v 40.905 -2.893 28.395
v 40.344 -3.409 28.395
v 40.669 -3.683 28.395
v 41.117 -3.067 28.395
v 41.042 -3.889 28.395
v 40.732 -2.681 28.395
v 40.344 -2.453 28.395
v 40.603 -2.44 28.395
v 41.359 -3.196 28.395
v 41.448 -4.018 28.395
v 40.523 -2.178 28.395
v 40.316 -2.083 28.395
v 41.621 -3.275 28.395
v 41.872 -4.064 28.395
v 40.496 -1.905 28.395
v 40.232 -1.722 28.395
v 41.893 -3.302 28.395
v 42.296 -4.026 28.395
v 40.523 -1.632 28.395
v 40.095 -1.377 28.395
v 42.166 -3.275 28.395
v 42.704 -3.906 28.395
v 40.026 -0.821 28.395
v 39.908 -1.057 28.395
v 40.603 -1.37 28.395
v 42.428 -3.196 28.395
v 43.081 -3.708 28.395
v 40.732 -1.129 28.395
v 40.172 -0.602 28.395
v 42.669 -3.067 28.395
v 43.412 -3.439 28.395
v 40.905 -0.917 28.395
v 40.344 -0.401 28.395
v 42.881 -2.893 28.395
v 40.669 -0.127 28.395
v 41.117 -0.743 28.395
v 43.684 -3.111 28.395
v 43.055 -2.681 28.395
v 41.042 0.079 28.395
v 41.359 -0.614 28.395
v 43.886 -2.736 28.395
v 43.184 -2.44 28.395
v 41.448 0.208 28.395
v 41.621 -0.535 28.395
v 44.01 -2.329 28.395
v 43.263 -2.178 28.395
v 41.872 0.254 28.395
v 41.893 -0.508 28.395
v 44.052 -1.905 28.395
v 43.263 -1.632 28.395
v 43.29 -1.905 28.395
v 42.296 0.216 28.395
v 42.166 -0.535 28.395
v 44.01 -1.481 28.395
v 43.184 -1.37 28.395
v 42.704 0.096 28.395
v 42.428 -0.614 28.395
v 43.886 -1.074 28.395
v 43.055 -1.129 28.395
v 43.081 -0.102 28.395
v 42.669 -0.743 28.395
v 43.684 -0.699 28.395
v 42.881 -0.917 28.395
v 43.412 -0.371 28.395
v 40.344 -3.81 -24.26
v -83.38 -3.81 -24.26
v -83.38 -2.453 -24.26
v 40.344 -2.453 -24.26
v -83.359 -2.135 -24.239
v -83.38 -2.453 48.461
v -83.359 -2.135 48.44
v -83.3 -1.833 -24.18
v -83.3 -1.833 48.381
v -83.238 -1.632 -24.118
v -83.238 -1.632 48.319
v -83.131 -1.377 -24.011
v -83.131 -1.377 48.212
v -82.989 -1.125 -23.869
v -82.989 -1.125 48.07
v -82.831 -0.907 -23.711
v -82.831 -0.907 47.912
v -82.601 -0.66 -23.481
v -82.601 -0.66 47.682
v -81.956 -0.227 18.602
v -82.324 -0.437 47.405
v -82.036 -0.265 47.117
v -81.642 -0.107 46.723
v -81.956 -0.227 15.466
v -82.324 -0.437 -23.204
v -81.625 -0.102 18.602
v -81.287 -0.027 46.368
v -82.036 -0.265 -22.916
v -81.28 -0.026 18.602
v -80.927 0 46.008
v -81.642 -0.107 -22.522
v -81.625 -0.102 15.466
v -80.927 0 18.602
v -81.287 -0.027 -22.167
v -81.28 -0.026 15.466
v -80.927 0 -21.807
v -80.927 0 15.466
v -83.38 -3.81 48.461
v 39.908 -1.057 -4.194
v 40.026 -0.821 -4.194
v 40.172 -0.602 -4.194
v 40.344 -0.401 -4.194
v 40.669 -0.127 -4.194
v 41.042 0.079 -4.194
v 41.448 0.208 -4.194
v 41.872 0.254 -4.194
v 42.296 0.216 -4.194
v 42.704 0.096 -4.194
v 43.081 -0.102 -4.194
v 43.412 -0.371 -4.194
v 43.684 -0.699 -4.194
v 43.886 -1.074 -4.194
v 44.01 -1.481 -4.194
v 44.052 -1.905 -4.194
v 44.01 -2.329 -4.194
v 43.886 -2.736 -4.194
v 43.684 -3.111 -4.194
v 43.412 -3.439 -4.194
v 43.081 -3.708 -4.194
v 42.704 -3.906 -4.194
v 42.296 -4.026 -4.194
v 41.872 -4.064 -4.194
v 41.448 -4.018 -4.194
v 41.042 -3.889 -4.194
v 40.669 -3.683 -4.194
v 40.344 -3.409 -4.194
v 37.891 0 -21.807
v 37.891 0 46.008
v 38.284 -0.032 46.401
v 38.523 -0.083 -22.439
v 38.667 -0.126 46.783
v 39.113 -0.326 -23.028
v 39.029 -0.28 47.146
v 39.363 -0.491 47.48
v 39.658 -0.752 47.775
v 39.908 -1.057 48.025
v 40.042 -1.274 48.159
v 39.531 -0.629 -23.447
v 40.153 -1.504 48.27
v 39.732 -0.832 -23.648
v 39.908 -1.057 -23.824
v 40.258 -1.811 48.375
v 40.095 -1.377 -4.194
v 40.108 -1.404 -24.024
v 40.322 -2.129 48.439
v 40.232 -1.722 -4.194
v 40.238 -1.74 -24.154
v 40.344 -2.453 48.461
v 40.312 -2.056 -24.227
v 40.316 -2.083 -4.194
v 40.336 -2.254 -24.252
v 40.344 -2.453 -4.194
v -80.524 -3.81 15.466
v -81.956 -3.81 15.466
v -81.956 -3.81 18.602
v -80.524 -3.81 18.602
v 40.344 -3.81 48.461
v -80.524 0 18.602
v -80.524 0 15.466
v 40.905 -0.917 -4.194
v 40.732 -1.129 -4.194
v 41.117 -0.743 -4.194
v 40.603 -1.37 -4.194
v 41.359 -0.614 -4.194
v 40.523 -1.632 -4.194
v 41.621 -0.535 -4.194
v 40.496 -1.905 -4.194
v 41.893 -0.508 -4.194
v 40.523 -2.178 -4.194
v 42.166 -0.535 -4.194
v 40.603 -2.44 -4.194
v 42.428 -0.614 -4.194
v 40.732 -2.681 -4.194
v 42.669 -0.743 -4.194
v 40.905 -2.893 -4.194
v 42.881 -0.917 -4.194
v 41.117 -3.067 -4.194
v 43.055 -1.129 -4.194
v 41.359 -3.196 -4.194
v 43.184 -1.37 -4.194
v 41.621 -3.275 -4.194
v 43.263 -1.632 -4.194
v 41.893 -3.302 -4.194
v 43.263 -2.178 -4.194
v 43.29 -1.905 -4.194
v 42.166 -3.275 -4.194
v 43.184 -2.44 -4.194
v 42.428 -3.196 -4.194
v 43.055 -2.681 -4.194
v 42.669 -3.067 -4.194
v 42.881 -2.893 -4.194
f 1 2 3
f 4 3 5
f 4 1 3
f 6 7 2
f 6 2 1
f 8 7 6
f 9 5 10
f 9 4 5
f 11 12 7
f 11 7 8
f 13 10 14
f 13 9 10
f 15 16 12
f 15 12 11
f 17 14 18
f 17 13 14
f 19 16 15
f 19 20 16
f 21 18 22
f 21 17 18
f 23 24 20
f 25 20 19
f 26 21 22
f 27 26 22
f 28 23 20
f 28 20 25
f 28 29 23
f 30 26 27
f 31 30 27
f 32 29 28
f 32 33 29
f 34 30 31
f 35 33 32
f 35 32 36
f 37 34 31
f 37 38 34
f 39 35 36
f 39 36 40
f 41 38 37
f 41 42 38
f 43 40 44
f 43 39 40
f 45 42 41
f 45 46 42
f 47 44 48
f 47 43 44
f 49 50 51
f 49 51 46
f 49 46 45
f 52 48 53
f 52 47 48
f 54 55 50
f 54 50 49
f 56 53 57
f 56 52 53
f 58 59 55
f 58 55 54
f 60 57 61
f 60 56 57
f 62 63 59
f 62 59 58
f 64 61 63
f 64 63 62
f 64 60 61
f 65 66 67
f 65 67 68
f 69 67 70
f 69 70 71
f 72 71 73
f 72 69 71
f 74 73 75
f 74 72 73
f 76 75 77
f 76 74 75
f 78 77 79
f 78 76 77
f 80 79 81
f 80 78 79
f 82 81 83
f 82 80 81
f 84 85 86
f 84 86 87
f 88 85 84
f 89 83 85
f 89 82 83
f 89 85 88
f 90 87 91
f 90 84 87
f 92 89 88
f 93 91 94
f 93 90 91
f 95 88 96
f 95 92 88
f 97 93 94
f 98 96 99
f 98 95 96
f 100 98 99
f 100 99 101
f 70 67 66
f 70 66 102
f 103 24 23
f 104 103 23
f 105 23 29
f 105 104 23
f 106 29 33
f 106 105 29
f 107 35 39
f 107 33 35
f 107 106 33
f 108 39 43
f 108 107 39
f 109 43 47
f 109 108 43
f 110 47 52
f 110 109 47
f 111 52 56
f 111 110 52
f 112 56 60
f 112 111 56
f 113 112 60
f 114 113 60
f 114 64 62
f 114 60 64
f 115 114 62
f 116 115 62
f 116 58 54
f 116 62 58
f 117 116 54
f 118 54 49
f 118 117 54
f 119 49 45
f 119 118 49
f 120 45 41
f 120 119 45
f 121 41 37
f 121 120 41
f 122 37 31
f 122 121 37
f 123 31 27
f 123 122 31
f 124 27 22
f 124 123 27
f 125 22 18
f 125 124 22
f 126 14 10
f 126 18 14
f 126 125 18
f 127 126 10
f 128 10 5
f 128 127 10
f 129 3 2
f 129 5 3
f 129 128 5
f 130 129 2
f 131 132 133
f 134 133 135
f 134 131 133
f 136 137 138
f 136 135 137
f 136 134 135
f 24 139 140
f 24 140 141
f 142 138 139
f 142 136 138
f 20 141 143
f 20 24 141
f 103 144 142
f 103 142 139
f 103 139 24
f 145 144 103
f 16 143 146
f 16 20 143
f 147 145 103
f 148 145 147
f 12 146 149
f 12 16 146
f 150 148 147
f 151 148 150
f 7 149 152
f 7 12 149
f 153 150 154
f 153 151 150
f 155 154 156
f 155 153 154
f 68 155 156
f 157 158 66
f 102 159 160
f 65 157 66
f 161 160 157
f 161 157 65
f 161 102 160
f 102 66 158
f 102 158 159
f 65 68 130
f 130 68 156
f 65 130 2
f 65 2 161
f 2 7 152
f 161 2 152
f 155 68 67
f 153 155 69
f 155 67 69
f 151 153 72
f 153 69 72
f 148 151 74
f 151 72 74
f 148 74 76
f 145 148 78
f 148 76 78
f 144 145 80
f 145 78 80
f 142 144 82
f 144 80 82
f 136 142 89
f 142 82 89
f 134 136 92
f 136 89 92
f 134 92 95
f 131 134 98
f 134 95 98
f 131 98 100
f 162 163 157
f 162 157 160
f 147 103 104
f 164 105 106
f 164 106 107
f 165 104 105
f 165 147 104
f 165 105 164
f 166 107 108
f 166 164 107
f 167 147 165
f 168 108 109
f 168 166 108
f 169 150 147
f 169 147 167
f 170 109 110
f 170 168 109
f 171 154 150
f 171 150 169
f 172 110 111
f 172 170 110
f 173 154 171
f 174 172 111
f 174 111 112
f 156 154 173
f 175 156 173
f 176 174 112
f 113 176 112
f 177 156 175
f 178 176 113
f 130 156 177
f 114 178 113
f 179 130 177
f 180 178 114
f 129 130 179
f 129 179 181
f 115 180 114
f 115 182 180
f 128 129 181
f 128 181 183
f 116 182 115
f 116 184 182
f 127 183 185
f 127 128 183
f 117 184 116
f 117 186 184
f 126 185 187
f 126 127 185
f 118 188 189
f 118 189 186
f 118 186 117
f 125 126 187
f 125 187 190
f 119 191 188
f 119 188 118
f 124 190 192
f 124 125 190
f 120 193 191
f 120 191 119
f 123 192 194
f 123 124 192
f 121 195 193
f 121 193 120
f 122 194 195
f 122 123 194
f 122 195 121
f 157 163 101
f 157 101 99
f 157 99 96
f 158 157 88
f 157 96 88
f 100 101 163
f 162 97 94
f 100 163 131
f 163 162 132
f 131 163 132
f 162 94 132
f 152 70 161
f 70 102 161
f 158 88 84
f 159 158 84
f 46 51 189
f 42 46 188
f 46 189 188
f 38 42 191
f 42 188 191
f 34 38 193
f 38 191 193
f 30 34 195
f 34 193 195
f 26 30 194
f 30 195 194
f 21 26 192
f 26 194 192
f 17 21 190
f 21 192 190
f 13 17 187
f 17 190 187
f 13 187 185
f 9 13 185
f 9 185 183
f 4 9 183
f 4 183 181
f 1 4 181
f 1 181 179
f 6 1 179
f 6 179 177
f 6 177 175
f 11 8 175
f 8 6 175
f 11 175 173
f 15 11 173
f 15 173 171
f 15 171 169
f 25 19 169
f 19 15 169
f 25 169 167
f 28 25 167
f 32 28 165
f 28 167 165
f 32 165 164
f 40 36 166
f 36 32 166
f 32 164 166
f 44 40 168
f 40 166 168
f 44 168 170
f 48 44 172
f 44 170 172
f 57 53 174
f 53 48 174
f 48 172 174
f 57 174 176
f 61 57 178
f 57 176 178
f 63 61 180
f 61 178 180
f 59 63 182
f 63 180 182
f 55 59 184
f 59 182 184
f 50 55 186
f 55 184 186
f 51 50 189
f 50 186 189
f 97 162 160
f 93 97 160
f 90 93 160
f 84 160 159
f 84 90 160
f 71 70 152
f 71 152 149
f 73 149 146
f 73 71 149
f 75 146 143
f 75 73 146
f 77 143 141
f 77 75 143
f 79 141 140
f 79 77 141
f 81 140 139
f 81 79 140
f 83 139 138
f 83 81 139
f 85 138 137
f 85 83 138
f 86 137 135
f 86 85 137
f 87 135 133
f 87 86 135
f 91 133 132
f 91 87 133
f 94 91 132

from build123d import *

# Parameters (mm, degrees)
F0_W          = 123.7234
F0_H          = 72.7202
F1_DEPTH      = 3.81
F2_R          = 2.159
F2_R_2        = 1.397
F3_DEPTH      = 72.7202
F4_R          = 1.397
F5_DEPTH      = 20.066
F6_R          = 1.397
F7_DEPTH      = 20.066
F8_W          = 1.4323815703
F8_H          = 3.1365510076
F9_DEPTH      = 25.4
F10_T1_DEPTH  = 135.9876048969
F10_T3_DEPTH  = 84.9844048969
F10_T8_DEPTH  = 84.9844048969
F10_S10_R     = 2.159
F10_T11_DEPTH = 44
F10_T15_DEPTH = 84.9844048969
F10_S17_R     = 2.159
F10_T18_DEPTH = 44
F10_T22_DEPTH = 84.9844048969
F10_S24_R     = 2.159
F10_T25_DEPTH = 44
F10_T30_DEPTH = 84.9844048969
F10_S31_R     = 2.159
F10_T32_DEPTH = 44
F10_T37_DEPTH = 84.9844048969
F10_S38_R     = 2.159
F10_T39_DEPTH = 44


# Not quite as in the source:
# - a fillet or chamfer that OpenCascade refuses, or shapes differently, is made with other operations: its cross-section is extruded or revolved along the edge and cut away or added


with BuildPart() as f1:
    # F0 (on Front) → F1 (new body)
    with BuildSketch(Plane.XZ):
        with Locations((-21.517843008, 12.1004326615)):
            Rectangle(F0_W, F0_H)
    extrude(amount=F1_DEPTH)

    # F2 (on face) → F3 (join)
    with BuildSketch(Plane(origin=(0, 0, -24.2596673385), x_dir=(1, 0, 0), z_dir=(0, 0, -1))):
        with Locations((41.893256992, 1.905)):
            Circle(F2_R)
        with Locations((41.893256992, 1.905)):
            Circle(F2_R_2, mode=Mode.SUBTRACT)
    extrude(amount=-F3_DEPTH)

    # F4 (on face) → F5 (cut)
    with BuildSketch(Plane(origin=(0, 0, -24.2596673385), x_dir=(1, 0, 0), z_dir=(0, 0, -1))):
        with BuildLine():
            ThreePointArc((40.343856992, 0.4014573036), (44.052256992, 1.905), (40.343856992, 3.4085426964))
            Line((40.343856992, 3.4085426964), (40.343856992, 0.4014573036))
        make_face()
        with Locations((41.893256992, 1.905)):
            Circle(F4_R, mode=Mode.SUBTRACT)
    extrude(amount=-F5_DEPTH, mode=Mode.SUBTRACT)

    # F6 (on face) → F7 (cut)
    with BuildSketch(Plane.XY.offset(48.4605326615)):
        with BuildLine():
            ThreePointArc((40.343856992, -3.4085426964), (44.052256992, -1.905), (40.343856992, -0.4014573036))
            Line((40.343856992, -0.4014573036), (40.343856992, -3.4085426964))
        make_face()
        with Locations((41.893256992, -1.905)):
            Circle(F6_R, mode=Mode.SUBTRACT)
    extrude(amount=-F7_DEPTH, mode=Mode.SUBTRACT)

    # F8 (on face) → F9 (cut)
    with BuildSketch(Plane(origin=(0, 0, 0), x_dir=(-1, 0, 0), z_dir=(0, 1, 0))):
        with Locations((81.2400989234, 17.0341590419)):
            Rectangle(F8_W, F8_H)
    extrude(amount=-F9_DEPTH, mode=Mode.SUBTRACT)

    # F10: fillet of radius 2.4528409794 on 4 edges, made by hand

    # F10_s2 → F10_t1 (cut)
    with BuildSketch(Plane.YZ.offset(-89.5116454565)):
        with BuildLine():
            ThreePointArc((-2.4528409794, 48.4605326615), (-0.7184204897, 47.7421121718), (0, 46.0076916821))
            Line((0, 46.0076916821), (0, 48.4605326615))
            Line((0, 48.4605326615), (-2.4528409794, 48.4605326615))
        make_face()
        with BuildLine():
            ThreePointArc((-2.4528409794, -24.2596673385), (-0.7184204897, -23.5412468488), (0, -21.8068263591))
            Line((0, -21.8068263591), (0, -24.2596673385))
            Line((0, -24.2596673385), (-2.4528409794, -24.2596673385))
        make_face()
    extrude(amount=F10_T1_DEPTH, mode=Mode.SUBTRACT)

    # F10_s4 → F10_t3 (cut)
    with BuildSketch(Plane.XY.offset(-30.3917697869)):
        with BuildLine():
            ThreePointArc((-83.379543008, -2.4528409794), (-82.6611225184, -0.7184204897), (-80.9267020287, 0))
            Line((-80.9267020287, 0), (-83.379543008, 0))
            Line((-83.379543008, 0), (-83.379543008, -2.4528409794))
        make_face()
    extrude(amount=F10_T3_DEPTH, mode=Mode.SUBTRACT)


with BuildPart() as f10_tool6:
    # F10_s7 → F10_t8 (new body)
    with BuildSketch(Plane.XY.offset(-30.3917697869)):
        with BuildLine():
            ThreePointArc((37.8910160126, 0), (39.6254365023, -0.7184204897), (40.343856992, -2.4528409794))
            Line((40.343856992, -2.4528409794), (40.343856992, 0))
            Line((40.343856992, 0), (37.8910160126, 0))
        make_face()
    extrude(amount=F10_T8_DEPTH)

    split(bisect_by=Plane.XY.offset(-4.1936673385), keep=Keep.BOTTOM)

    # F10_s10 → F10_t11 (cut, symmetric)
    with BuildSketch(Plane.XY.offset(12.1)):
        with Locations((41.893256992, -1.905)):
            Circle(F10_S10_R)
    extrude(amount=F10_T11_DEPTH, both=True, mode=Mode.SUBTRACT)


with BuildPart() as f1_1:
    add(f1.part)

    # F10_t5: cut F10_tool6
    add(f10_tool6.part, mode=Mode.SUBTRACT)


with BuildPart() as f10_tool13:
    # F10_s14 → F10_t15 (new body)
    with BuildSketch(Plane.XY.offset(-30.3917697869)):
        with BuildLine():
            ThreePointArc((37.8910160126, 0), (39.6254365023, -0.7184204897), (40.343856992, -2.4528409794))
            Line((40.343856992, -2.4528409794), (40.343856992, 0))
            Line((40.343856992, 0), (37.8910160126, 0))
        make_face()
    extrude(amount=F10_T15_DEPTH)

    split(bisect_by=Plane.XY.offset(-4.1936673385), keep=Keep.BOTTOM)

    # F10_s17 → F10_t18 (intersect, symmetric)
    with BuildSketch(Plane.XY.offset(12.1)):
        with Locations((41.893256992, -1.905)):
            Circle(F10_S17_R)
    extrude(amount=F10_T18_DEPTH, both=True, mode=Mode.INTERSECT)


with BuildPart() as f1_2:
    add(f1_1.part)

    # F10_t12: cut F10_tool13
    add(f10_tool13.part, mode=Mode.SUBTRACT)


with BuildPart() as f10_tool20:
    # F10_s21 → F10_t22 (new body)
    with BuildSketch(Plane.XY.offset(-30.3917697869)):
        with BuildLine():
            ThreePointArc((37.8910160126, 0), (39.6254365023, -0.7184204897), (40.343856992, -2.4528409794))
            Line((40.343856992, -2.4528409794), (40.343856992, 0))
            Line((40.343856992, 0), (37.8910160126, 0))
        make_face()
    extrude(amount=F10_T22_DEPTH)

    split(bisect_by=Plane.XY.offset(-4.1936673385), keep=Keep.TOP)

    # F10_s24 → F10_t25 (cut, symmetric)
    with BuildSketch(Plane.XY.offset(12.1)):
        with Locations((41.893256992, -1.905)):
            Circle(F10_S24_R)
    extrude(amount=F10_T25_DEPTH, both=True, mode=Mode.SUBTRACT)

    split(bisect_by=Plane.XY.offset(28.3945326615), keep=Keep.BOTTOM)


with BuildPart() as f1_3:
    add(f1_2.part)

    # F10_t19: cut F10_tool20
    add(f10_tool20.part, mode=Mode.SUBTRACT)


with BuildPart() as f10_tool28:
    # F10_s29 → F10_t30 (new body)
    with BuildSketch(Plane.XY.offset(-30.3917697869)):
        with BuildLine():
            ThreePointArc((37.8910160126, 0), (39.6254365023, -0.7184204897), (40.343856992, -2.4528409794))
            Line((40.343856992, -2.4528409794), (40.343856992, 0))
            Line((40.343856992, 0), (37.8910160126, 0))
        make_face()
    extrude(amount=F10_T30_DEPTH)

    # F10_s31 → F10_t32 (cut, symmetric)
    with BuildSketch(Plane.XY.offset(12.1)):
        with Locations((41.893256992, -1.905)):
            Circle(F10_S31_R)
    extrude(amount=F10_T32_DEPTH, both=True, mode=Mode.SUBTRACT)

    split(bisect_by=Plane.XY.offset(28.3945326615), keep=Keep.TOP)


with BuildPart() as f1_4:
    add(f1_3.part)

    # F10_t27: cut F10_tool28
    add(f10_tool28.part, mode=Mode.SUBTRACT)


with BuildPart() as f10_tool35:
    # F10_s36 → F10_t37 (new body)
    with BuildSketch(Plane.XY.offset(-30.3917697869)):
        with BuildLine():
            ThreePointArc((37.8910160126, 0), (39.6254365023, -0.7184204897), (40.343856992, -2.4528409794))
            Line((40.343856992, -2.4528409794), (40.343856992, 0))
            Line((40.343856992, 0), (37.8910160126, 0))
        make_face()
    extrude(amount=F10_T37_DEPTH)

    # F10_s38 → F10_t39 (intersect, symmetric)
    with BuildSketch(Plane.XY.offset(12.1)):
        with Locations((41.893256992, -1.905)):
            Circle(F10_S38_R)
    extrude(amount=F10_T39_DEPTH, both=True, mode=Mode.INTERSECT)

    split(bisect_by=Plane.XY.offset(28.3945326615), keep=Keep.TOP)


with BuildPart() as f1_5:
    add(f1_4.part)

    # F10_t34: cut F10_tool35
    add(f10_tool35.part, mode=Mode.SUBTRACT)


solid = f1_5.part
